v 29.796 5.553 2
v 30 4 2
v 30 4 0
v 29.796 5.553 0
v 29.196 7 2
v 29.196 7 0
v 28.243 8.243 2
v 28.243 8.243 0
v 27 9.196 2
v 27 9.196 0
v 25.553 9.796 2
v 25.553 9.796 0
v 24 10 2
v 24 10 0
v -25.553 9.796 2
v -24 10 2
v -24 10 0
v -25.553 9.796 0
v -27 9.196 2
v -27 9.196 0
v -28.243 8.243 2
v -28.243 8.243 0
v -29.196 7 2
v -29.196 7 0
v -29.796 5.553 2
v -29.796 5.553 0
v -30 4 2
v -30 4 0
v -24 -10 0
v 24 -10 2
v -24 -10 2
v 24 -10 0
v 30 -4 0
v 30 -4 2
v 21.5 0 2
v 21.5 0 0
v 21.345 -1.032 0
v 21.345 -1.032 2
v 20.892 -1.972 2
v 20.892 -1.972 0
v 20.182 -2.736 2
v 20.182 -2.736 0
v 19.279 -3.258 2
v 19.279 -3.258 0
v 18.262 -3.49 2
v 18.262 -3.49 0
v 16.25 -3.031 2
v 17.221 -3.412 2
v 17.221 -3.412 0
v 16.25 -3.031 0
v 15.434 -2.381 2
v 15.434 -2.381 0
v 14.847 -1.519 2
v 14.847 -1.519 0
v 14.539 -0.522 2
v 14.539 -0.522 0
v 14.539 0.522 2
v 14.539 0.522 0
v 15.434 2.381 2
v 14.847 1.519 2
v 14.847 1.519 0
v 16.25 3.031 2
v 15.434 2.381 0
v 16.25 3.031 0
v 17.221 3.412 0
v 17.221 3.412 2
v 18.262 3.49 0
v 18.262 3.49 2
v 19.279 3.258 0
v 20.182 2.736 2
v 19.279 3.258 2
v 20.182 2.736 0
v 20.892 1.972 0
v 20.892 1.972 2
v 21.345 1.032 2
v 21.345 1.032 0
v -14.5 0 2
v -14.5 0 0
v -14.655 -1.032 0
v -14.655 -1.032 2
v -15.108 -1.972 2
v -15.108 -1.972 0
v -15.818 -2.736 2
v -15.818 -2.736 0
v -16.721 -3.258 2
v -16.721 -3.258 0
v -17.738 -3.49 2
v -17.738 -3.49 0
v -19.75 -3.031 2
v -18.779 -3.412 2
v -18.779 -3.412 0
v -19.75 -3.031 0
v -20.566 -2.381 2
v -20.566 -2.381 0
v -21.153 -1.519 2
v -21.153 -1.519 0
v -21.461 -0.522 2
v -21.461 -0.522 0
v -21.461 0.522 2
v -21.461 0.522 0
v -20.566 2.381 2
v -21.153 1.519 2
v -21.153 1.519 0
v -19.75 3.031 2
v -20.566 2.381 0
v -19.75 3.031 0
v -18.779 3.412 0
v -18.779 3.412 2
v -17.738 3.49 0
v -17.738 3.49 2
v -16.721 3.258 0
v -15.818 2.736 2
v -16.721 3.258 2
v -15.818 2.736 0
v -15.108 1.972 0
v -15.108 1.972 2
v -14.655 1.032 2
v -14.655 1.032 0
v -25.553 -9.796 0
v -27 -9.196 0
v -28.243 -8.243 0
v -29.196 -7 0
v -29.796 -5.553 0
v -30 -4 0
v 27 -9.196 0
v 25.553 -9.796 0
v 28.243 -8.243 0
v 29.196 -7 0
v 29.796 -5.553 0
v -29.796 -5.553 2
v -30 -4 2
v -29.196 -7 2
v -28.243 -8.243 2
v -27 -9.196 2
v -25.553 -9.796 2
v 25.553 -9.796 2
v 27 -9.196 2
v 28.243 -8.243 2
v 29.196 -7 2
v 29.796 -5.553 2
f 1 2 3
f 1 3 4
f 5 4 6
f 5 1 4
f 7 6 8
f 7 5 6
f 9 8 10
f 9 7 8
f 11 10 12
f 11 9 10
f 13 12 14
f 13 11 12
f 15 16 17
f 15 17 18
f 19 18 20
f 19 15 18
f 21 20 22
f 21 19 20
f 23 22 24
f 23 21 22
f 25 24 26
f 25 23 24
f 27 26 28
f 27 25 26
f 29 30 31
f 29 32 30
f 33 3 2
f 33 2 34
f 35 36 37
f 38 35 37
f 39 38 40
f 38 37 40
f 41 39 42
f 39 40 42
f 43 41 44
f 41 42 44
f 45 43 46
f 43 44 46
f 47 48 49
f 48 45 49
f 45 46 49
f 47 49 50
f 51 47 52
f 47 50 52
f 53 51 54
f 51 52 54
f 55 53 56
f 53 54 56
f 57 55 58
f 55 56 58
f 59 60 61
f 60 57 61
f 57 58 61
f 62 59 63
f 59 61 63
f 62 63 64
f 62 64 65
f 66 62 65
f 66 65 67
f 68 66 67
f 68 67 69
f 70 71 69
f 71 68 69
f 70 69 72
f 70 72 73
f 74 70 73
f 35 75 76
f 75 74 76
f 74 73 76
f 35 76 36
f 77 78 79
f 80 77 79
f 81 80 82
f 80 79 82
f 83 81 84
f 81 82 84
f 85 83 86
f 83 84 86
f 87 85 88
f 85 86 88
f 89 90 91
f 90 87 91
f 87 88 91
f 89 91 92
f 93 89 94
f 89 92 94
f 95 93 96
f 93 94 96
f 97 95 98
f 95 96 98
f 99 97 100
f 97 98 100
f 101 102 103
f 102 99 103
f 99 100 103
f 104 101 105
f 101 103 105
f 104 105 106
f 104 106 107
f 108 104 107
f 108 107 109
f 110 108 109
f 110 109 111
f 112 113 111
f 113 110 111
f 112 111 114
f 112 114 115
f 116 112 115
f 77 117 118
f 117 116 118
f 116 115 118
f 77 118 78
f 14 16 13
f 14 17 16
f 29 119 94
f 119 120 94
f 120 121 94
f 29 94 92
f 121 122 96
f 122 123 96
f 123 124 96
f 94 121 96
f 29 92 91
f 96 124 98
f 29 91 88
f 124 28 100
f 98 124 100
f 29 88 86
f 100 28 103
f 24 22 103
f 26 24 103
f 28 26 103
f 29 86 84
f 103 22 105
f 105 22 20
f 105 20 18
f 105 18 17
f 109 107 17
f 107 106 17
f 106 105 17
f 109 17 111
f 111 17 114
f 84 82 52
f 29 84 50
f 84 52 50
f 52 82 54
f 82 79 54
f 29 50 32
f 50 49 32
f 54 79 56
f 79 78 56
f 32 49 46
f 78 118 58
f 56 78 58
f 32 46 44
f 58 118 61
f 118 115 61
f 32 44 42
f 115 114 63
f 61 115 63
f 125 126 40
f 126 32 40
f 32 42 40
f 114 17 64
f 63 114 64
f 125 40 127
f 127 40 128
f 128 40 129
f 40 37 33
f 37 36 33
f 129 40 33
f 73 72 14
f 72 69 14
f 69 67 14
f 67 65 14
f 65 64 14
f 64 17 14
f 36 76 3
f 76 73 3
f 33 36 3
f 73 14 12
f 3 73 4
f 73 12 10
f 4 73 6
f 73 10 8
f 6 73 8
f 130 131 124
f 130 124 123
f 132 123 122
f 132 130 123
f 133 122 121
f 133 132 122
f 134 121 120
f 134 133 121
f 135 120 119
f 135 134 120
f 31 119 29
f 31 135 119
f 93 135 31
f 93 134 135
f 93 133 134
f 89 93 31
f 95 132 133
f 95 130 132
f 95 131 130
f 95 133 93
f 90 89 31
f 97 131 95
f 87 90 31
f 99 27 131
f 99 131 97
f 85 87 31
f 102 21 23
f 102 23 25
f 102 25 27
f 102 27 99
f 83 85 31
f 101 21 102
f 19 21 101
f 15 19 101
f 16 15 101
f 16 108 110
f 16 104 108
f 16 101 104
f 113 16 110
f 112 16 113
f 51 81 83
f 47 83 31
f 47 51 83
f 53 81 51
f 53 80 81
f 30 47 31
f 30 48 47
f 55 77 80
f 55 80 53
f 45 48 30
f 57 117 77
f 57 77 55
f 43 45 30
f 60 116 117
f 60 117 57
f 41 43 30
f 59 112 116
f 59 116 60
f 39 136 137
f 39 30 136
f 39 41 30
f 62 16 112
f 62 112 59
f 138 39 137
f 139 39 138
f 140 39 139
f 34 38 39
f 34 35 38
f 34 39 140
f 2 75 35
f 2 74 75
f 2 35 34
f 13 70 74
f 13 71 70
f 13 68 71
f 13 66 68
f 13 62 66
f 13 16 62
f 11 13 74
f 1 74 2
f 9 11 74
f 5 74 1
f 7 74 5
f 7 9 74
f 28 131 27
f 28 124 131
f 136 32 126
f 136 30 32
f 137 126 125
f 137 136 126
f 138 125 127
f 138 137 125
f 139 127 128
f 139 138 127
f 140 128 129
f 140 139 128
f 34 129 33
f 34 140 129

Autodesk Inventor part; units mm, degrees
ref_plane "YZ Plane" through (0, 0, 0) normal (1, 0, 0) x (0, 1, 0)
ref_plane "XZ Plane" through (0, 0, 0) normal (0, 1, 0) x (-1, 0, 0)
ref_plane "XY Plane" through (0, 0, 0) normal (0, 0, 1) x (1, 0, 0)
sketch "Sketch1" plane through (0, 0, 0) normal (0, 0, 1) x (1, 0, 0)
  line L0 (-30, 10) -> (30, 10)
  line L1 (30, 10) -> (30, -10)
  line L2 (30, -10) -> (-30, -10)
  line L3 (-30, -10) -> (-30, 10)
  line L4 (-30, 10) -> (30, -10) construction
  line L5 (30, 10) -> (-30, -10) construction
  circle A0 centre (18, 0) radius 3.5
  circle A1 centre (-18, 0) radius 3.5
  line L6 (0, 10) -> (0, -10) construction
  point P0 (0, 0)
  point P1 (0, 0)
  dimension "d0" = 60
  dimension "d1" = 20
  dimension "d2" = 7
  dimension "d3" = 36
extrude "Plate1" add sketch "Sketch1" along normal blind 2
fillet "Corner Round1" radius 6 4 edges at (-30, 10, 1) (-30, -10, 1) (30, 10, 1) (30, -10, 1)
equation "\"d4\" = Thickness"
equation "\"BendRadius\" = Thickness"
equation "\"BendReliefWidth\" = Thickness"
equation "\"BendReliefDepth\" = 0.5 * Thickness"
equation "\"CornerReliefSize\" = 4 * Thickness"
equation "\"MinimumRemnant\" = 2 * Thickness"
equation "\"TransitionRadius\" = BendRadius"
equation "\"JacobiRadiusSize\" = BendRadius"
equation "\"GapSize\" = Thickness"
equation "\"Thickness\" = 2"
properties part number "motor pillar 1"
